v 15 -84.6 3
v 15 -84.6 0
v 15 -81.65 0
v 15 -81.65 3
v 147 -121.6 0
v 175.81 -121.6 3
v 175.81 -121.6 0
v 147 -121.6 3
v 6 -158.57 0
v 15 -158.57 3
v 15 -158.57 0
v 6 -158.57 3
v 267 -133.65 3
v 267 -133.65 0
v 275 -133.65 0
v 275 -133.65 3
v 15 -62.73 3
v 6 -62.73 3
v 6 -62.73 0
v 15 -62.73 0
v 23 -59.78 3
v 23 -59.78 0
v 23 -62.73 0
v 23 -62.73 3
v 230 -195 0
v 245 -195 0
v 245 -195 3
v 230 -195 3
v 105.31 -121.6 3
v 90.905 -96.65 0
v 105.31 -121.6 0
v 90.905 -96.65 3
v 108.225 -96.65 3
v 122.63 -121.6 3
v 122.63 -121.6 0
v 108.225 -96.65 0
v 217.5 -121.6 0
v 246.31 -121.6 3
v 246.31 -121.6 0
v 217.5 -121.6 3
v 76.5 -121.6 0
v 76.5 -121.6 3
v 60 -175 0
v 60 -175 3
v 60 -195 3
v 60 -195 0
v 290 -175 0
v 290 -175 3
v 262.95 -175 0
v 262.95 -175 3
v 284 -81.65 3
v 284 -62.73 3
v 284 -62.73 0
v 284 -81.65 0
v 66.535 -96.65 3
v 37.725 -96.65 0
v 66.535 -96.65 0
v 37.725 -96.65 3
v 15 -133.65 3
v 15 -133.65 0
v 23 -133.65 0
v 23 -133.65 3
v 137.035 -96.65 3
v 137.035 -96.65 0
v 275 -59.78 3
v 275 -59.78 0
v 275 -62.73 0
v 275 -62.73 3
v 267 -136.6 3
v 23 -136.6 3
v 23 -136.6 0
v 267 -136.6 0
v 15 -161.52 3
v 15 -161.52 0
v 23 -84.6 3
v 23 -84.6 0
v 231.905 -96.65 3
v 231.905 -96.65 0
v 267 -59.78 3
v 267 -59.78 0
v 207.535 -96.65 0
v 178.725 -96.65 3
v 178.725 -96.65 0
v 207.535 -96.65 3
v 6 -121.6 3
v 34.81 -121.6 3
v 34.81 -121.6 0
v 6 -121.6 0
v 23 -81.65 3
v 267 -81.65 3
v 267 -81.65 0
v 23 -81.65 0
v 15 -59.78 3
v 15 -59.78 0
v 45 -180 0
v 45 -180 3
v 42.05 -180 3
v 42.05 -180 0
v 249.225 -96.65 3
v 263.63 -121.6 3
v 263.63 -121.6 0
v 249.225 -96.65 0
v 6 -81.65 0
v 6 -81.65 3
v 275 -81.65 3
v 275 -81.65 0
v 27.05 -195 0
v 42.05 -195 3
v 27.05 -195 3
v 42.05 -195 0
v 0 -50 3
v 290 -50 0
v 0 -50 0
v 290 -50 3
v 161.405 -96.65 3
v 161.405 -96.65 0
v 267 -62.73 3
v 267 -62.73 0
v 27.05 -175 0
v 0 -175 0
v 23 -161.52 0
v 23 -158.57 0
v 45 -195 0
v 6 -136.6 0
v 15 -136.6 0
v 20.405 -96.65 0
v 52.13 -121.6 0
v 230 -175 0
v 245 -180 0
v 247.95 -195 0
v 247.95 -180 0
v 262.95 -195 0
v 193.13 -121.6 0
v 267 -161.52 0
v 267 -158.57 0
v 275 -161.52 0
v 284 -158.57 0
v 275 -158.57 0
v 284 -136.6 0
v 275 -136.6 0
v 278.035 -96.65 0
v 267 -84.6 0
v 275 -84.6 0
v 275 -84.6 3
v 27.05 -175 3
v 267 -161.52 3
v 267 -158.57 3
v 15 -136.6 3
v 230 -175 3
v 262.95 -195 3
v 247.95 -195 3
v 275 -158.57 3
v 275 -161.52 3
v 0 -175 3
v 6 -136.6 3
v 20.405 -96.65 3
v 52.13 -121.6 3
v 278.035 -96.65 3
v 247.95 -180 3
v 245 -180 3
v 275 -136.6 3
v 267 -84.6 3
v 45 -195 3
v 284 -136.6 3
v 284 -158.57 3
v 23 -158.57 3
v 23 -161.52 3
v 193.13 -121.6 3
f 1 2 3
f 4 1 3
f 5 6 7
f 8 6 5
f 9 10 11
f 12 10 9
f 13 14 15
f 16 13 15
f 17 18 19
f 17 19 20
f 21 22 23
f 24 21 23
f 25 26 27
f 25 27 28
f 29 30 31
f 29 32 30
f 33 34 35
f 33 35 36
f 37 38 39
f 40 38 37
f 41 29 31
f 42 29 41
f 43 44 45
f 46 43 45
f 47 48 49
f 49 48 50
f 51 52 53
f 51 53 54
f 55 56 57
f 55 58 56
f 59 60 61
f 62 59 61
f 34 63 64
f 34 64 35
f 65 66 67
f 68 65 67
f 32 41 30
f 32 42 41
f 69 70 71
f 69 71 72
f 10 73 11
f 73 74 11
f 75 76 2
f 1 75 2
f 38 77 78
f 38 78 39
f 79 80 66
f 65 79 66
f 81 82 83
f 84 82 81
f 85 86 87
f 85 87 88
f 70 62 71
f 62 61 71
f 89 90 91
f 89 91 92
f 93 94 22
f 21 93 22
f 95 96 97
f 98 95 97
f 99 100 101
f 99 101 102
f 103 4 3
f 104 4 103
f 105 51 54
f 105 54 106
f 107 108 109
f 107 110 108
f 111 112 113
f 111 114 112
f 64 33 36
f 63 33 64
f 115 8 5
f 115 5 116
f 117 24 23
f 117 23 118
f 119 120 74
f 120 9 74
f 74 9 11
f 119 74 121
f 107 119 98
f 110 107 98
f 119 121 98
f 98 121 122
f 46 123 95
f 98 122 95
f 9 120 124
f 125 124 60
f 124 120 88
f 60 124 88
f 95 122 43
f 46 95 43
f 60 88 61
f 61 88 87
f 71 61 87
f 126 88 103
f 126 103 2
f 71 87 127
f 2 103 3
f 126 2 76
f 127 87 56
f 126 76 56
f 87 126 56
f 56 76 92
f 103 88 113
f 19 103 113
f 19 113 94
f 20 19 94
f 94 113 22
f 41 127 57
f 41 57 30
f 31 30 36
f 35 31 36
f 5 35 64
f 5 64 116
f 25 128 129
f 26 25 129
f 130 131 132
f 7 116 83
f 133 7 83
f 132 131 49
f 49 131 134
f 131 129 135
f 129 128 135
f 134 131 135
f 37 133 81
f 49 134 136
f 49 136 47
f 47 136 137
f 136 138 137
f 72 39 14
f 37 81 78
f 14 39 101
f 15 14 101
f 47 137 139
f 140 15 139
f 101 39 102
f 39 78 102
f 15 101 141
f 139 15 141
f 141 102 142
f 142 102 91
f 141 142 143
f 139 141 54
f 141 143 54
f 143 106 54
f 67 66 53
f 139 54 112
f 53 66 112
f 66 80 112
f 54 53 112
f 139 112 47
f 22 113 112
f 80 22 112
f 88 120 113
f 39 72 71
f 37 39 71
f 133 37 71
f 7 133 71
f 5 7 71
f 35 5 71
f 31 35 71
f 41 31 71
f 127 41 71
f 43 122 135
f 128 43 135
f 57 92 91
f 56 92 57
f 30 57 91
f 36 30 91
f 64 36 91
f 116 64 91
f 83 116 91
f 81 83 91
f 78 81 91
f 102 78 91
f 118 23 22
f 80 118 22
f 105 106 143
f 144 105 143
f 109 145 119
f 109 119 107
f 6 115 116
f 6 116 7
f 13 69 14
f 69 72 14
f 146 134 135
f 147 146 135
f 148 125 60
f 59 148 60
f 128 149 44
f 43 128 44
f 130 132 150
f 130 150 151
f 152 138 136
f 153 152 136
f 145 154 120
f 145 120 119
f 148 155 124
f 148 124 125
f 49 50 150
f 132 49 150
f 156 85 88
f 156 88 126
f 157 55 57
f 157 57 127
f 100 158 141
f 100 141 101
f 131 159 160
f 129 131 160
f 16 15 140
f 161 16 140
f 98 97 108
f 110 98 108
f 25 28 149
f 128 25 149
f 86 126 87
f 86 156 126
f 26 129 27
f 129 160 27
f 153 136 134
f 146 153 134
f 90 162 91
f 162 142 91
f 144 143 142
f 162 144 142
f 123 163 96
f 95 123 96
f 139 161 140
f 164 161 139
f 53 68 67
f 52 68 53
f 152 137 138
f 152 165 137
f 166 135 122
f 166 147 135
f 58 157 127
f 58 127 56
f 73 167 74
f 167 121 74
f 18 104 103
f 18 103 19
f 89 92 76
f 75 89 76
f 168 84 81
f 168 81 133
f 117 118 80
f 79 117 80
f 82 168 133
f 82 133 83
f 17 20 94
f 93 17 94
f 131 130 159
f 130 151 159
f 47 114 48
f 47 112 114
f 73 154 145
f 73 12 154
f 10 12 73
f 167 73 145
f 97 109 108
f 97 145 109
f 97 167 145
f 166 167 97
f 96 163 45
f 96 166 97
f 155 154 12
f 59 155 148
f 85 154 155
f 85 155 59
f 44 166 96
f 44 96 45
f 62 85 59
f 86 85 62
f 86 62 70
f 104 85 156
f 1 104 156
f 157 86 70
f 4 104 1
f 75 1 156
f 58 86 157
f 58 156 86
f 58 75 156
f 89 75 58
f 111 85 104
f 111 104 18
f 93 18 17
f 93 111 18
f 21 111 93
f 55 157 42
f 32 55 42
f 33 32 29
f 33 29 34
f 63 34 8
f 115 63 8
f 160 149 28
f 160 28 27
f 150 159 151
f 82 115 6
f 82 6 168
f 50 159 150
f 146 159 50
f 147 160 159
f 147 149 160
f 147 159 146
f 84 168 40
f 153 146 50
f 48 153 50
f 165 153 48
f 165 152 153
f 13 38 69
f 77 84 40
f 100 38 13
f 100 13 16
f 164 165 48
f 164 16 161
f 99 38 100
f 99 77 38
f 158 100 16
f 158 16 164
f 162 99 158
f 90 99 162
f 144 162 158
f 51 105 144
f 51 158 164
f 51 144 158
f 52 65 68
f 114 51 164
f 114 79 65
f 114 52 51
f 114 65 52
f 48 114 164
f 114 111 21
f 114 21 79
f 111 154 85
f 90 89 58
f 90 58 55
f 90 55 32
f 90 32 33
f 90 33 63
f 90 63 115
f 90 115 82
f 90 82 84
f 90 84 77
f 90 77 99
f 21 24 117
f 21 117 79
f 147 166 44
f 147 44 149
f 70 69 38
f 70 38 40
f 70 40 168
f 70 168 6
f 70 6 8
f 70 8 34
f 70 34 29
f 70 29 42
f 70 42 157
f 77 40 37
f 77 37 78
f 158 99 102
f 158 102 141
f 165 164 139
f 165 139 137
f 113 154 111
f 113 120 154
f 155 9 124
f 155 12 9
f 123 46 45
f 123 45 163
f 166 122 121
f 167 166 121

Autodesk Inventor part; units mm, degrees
ref_plane "YZ Plane" through (0, 0, 0) normal (1, 0, 0) x (0, 1, 0)
ref_plane "XZ Plane" through (0, 0, 0) normal (0, 1, 0) x (-1, 0, 0)
ref_plane "XY Plane" through (0, 0, 0) normal (0, 0, 1) x (1, 0, 0)
sketch "草圖1" plane through (0, 0, 0) normal (0, 0, 1) x (1, 0, 0)
  line L0 (0, 0) -> (290, 0)
  line L1 (290, 0) -> (290, -195)
  line L2 (290, -195) -> (0, -195)
  line L3 (0, -195) -> (0, 0)
  line L4 (15, -59.78) -> (23, -59.78)
  line L5 (23, -59.78) -> (23, -62.73)
  line L6 (23, -62.73) -> (15, -62.73)
  line L7 (15, -62.73) -> (15, -59.78)
  line L8 (15, -81.65) -> (23, -81.65)
  line L9 (23, -81.65) -> (23, -84.6)
  line L10 (23, -84.6) -> (15, -84.6)
  line L11 (15, -84.6) -> (15, -81.65)
  line L12 (15, -133.65) -> (23, -133.65)
  line L13 (23, -133.65) -> (23, -136.6)
  line L14 (23, -136.6) -> (15, -136.6)
  line L15 (15, -136.6) -> (15, -133.65)
  line L16 (15, -158.57) -> (23, -158.57)
  line L17 (23, -158.57) -> (23, -161.52)
  line L18 (23, -161.52) -> (15, -161.52)
  line L19 (15, -161.52) -> (15, -158.57)
  line L20 (275, -81.65) -> (275, -84.6)
  line L21 (275, -59.78) -> (275, -62.73)
  line L22 (267, -81.65) -> (275, -81.65)
  line L23 (275, -62.73) -> (267, -62.73)
  line L24 (267, -59.78) -> (275, -59.78)
  line L25 (275, -84.6) -> (267, -84.6)
  line L26 (267, -84.6) -> (267, -81.65)
  line L27 (267, -62.73) -> (267, -59.78)
  line L28 (267, -133.65) -> (275, -133.65)
  line L29 (275, -133.65) -> (275, -136.6)
  line L30 (267, -136.6) -> (267, -133.65)
  line L31 (275, -136.6) -> (267, -136.6)
  line L32 (267, -158.57) -> (275, -158.57)
  line L33 (275, -158.57) -> (275, -161.52)
  line L34 (275, -161.52) -> (267, -161.52)
  line L35 (267, -161.52) -> (267, -158.57)
  line L36 (0, -97.5) -> (290, -97.5) construction
  line L37 (19, -84.6) -> (19, -133.65) construction
  line L38 (145, 0) -> (145, -195) construction
  line L39 (23, -83.125) -> (267, -83.125) construction
  point P0 (15, -83.125)
  point P1 (15, -61.255)
  point P2 (15, -135.125)
  point P3 (15, -160.045)
  point P4 (267, -61.255)
  point P5 (267, -135.125)
  point P6 (267, -160.045)
  point P7 (145, -83.125)
  dimension "d0" = 2.95
  dimension "d1" = 8
  dimension "d3" = 52
  dimension "d5" = 195
  dimension "d6" = 290
  dimension "d9" = 252
  dimension "d16" = 12.9
  dimension "d36" = 18.92
  dimension "d37" = 21.97
extrude "擠出1" add sketch "草圖1" along normal blind 3
sketch "草圖3" plane through (0, 0, 3) normal (0, 0, 1) x (1, 0, 0)
  line L0 (290, 0) -> (0, 0) projected
  line L1 (0, 0) -> (290, 0)
  line L2 (290, 0) -> (290, -50)
  line L3 (290, -50) -> (0, -50)
  line L4 (0, -50) -> (0, 0)
  line L5 (290, -195) -> (290, 0) projected
  line L6 (42.05, -195) -> (45, -195)
  line L7 (45, -195) -> (45, -180)
  line L8 (45, -180) -> (42.05, -180)
  line L9 (42.05, -180) -> (42.05, -195)
  line L10 (0, -195) -> (290, -195) projected
  line L11 (245, -195) -> (247.95, -195)
  line L12 (247.95, -195) -> (247.95, -180)
  line L13 (247.95, -180) -> (245, -180)
  line L14 (245, -180) -> (245, -195)
  line L15 (45, -187.5) -> (245, -187.5)
  point P0 (145, -195)
  point P1 (145, -187.5)
  point P2 (247.95, -195)
  dimension "d17" = 50
  dimension "d18" = 200
  dimension "d19" = 2.95
  dimension "d20" = 2.95
  dimension "d22" = 15
  dimension "d23" = 0
extrude "擠出2" cut sketch "草圖3" against normal up to surface (3 mm away) contours L2 L3 L4 L0 | L10 L14 L13 L12 | L6 L9 L8 L7
sketch "草圖6" plane through (0, 0, 3) normal (0, 0, 1) x (1, 0, 0)
  line L0 (6, -136.6) -> (284, -136.6)
  line L1 (284, -136.6) -> (284, -158.57)
  line L2 (284, -158.57) -> (6, -158.57)
  line L3 (6, -158.57) -> (6, -136.6)
  line L4 (23, -136.6) -> (15, -136.6) projected
  line L5 (15, -158.57) -> (23, -158.57) projected
  line L6 (0, -50) -> (0, -195) projected
  line L7 (290, -195) -> (290, -50) projected
  line L8 (6, -81.65) -> (6, -62.73)
  line L9 (6, -62.73) -> (284, -62.73)
  line L10 (284, -62.73) -> (284, -81.65)
  line L11 (284, -81.65) -> (6, -81.65)
  line L12 (15, -81.65) -> (23, -81.65) projected
  line L13 (23, -62.73) -> (15, -62.73) projected
  line L14 (20.4049, -96.65) -> (34.8098, -121.6)
  line L15 (34.8098, -121.6) -> (6, -121.6)
  line L16 (6, -121.6) -> (20.4049, -96.65)
  line L17 (37.7254, -96.65) -> (66.5352, -96.65)
  line L18 (66.5352, -96.65) -> (52.1303, -121.6)
  line L19 (52.1303, -121.6) -> (37.7254, -96.65)
  line L20 (105.3098, -121.6) -> (76.5, -121.6)
  line L21 (76.5, -121.6) -> (90.9049, -96.65)
  line L22 (90.9049, -96.65) -> (105.3098, -121.6)
  line L23 (122.6303, -121.6) -> (108.2254, -96.65)
  line L24 (137.0352, -96.65) -> (122.6303, -121.6)
  line L25 (108.2254, -96.65) -> (137.0352, -96.65)
  line L26 (175.8098, -121.6) -> (147, -121.6)
  line L27 (147, -121.6) -> (161.4049, -96.65)
  line L28 (161.4049, -96.65) -> (175.8098, -121.6)
  line L29 (193.1303, -121.6) -> (178.7254, -96.65)
  line L30 (207.5352, -96.65) -> (193.1303, -121.6)
  line L31 (178.7254, -96.65) -> (207.5352, -96.65)
  line L32 (246.3098, -121.6) -> (217.5, -121.6)
  line L33 (217.5, -121.6) -> (231.9049, -96.65)
  line L34 (231.9049, -96.65) -> (246.3098, -121.6)
  line L35 (263.6303, -121.6) -> (249.2254, -96.65)
  line L36 (278.0352, -96.65) -> (263.6303, -121.6)
  line L37 (249.2254, -96.65) -> (278.0352, -96.65)
  line L38 (45, -195) -> (245, -195) projected
  line L39 (60, -195) -> (230, -195)
  line L40 (230, -195) -> (230, -175)
  line L41 (230, -175) -> (60, -175)
  line L42 (60, -175) -> (60, -195)
  line L43 (262.95, -195) -> (290, -195)
  line L44 (290, -195) -> (290, -175)
  line L45 (290, -175) -> (262.95, -175)
  line L46 (262.95, -175) -> (262.95, -195)
  line L47 (0, -195) -> (42.05, -195) projected
  line L48 (27.05, -195) -> (0, -195)
  line L49 (0, -195) -> (0, -175)
  line L50 (0, -175) -> (27.05, -175)
  line L51 (27.05, -175) -> (27.05, -195)
  line L52 (42.05, -195) -> (42.05, -180) projected
  line L53 (45, -180) -> (45, -195) projected
  line L54 (245, -195) -> (245, -180) projected
  line L55 (247.95, -180) -> (247.95, -195) projected
  point P0 (0, 0)
  point P1 (284, -147.585)
  point P2 (20.4049, -113.2833)
  point P3 (52.1303, -104.9667)
  point P4 (122.6303, -104.9667)
  point P5 (90.9049, -113.2833)
  point P6 (193.1303, -104.9667)
  point P7 (161.4049, -113.2833)
  point P8 (263.6303, -104.9667)
  point P9 (231.9049, -113.2833)
  point P10 (42.05, -187.5)
  dimension "d32" = 6
  dimension "d33" = 6
  dimension "d39" = 15
  dimension "d40" = 15
  dimension "d41" = 15
  dimension "d44" = 70.5
  dimension "d49" = 20
  dimension "d50" = 15
  dimension "d51" = 15
  dimension "d52" = 15
  dimension "d53" = 15
extrude "擠出5" cut sketch "草圖6" against normal up to surface (3 mm away)
sketch "草圖8" plane through (0, 0, 3) normal (0, 0, 1) x (1, 0, 0)
  line L0 (275, -62.73) -> (284, -62.73) projected
  line L1 (284, -62.73) -> (284, -81.65) projected
  line L2 (284, -81.65) -> (275, -81.65) projected
  line L3 (275, -81.65) -> (275, -84.6) projected
  line L4 (275, -84.6) -> (267, -84.6) projected
  line L5 (267, -84.6) -> (267, -81.65) projected
  line L6 (267, -81.65) -> (23, -81.65) projected
  line L7 (23, -81.65) -> (23, -84.6) projected
  line L8 (23, -84.6) -> (15, -84.6) projected
  line L9 (15, -84.6) -> (15, -81.65) projected
  line L10 (15, -81.65) -> (6, -81.65) projected
  line L11 (6, -81.65) -> (6, -62.73) projected
  line L12 (6, -62.73) -> (15, -62.73) projected
  line L13 (15, -62.73) -> (15, -59.78) projected
  line L14 (15, -59.78) -> (23, -59.78) projected
  line L15 (23, -59.78) -> (23, -62.73) projected
  line L16 (23, -62.73) -> (267, -62.73) projected
  line L17 (267, -62.73) -> (267, -59.78) projected
  line L18 (267, -59.78) -> (275, -59.78) projected
  line L19 (275, -59.78) -> (275, -62.73) projected
  line L20 (15, -158.57) -> (6, -158.57) projected
  line L21 (6, -158.57) -> (6, -136.6) projected
  line L22 (6, -136.6) -> (15, -136.6) projected
  line L23 (15, -136.6) -> (15, -133.65) projected
  line L24 (15, -133.65) -> (23, -133.65) projected
  line L25 (23, -133.65) -> (23, -136.6) projected
  line L26 (23, -136.6) -> (267, -136.6) projected
  line L27 (267, -136.6) -> (267, -133.65) projected
  line L28 (267, -133.65) -> (275, -133.65) projected
  line L29 (275, -133.65) -> (275, -136.6) projected
  line L30 (275, -136.6) -> (284, -136.6) projected
  line L31 (284, -136.6) -> (284, -158.57) projected
  line L32 (284, -158.57) -> (275, -158.57) projected
  line L33 (275, -158.57) -> (275, -161.52) projected
  line L34 (275, -161.52) -> (267, -161.52) projected
  line L35 (267, -161.52) -> (267, -158.57) projected
  line L36 (267, -158.57) -> (23, -158.57) projected
  line L37 (23, -158.57) -> (23, -161.52) projected
  line L38 (23, -161.52) -> (15, -161.52) projected
  line L39 (15, -161.52) -> (15, -158.57) projected
  line L40 (52.1303, -121.6) -> (37.7254, -96.65) projected
  line L41 (37.7254, -96.65) -> (66.5352, -96.65) projected
  line L42 (66.5352, -96.65) -> (52.1303, -121.6) projected
  line L43 (207.5352, -96.65) -> (193.1303, -121.6) projected
  line L44 (193.1303, -121.6) -> (178.7254, -96.65) projected
  line L45 (178.7254, -96.65) -> (207.5352, -96.65) projected
  line L46 (108.2254, -96.65) -> (137.0352, -96.65) projected
  line L47 (137.0352, -96.65) -> (122.6303, -121.6) projected
  line L48 (122.6303, -121.6) -> (108.2254, -96.65) projected
  line L49 (249.2254, -96.65) -> (278.0352, -96.65) projected
  line L50 (278.0352, -96.65) -> (263.6303, -121.6) projected
  line L51 (263.6303, -121.6) -> (249.2254, -96.65) projected
  line L52 (90.9049, -96.65) -> (105.3098, -121.6) projected
  line L53 (105.3098, -121.6) -> (76.5, -121.6) projected
  line L54 (76.5, -121.6) -> (90.9049, -96.65) projected
  line L55 (147, -121.6) -> (161.4049, -96.65) projected
  line L56 (161.4049, -96.65) -> (175.8098, -121.6) projected
  line L57 (175.8098, -121.6) -> (147, -121.6) projected
  line L58 (34.8098, -121.6) -> (6, -121.6) projected
  line L59 (6, -121.6) -> (20.4049, -96.65) projected
  line L60 (20.4049, -96.65) -> (34.8098, -121.6) projected
  line L61 (217.5, -121.6) -> (231.9049, -96.65) projected
  line L62 (231.9049, -96.65) -> (246.3098, -121.6) projected
  line L63 (246.3098, -121.6) -> (217.5, -121.6) projected
  line L64 (262.95, -195) -> (262.95, -175) projected
  line L65 (262.95, -175) -> (290, -175) projected
  line L66 (290, -175) -> (290, -50) projected
  line L67 (290, -50) -> (0, -50) projected
  line L68 (0, -50) -> (0, -175) projected
  line L69 (0, -175) -> (27.05, -175) projected
  line L70 (27.05, -175) -> (27.05, -195) projected
  line L71 (27.05, -195) -> (42.05, -195) projected
  line L72 (42.05, -195) -> (42.05, -180) projected
  line L73 (42.05, -180) -> (45, -180) projected
  line L74 (45, -180) -> (45, -195) projected
  line L75 (45, -195) -> (60, -195) projected
  line L76 (60, -195) -> (60, -175) projected
  line L77 (60, -175) -> (230, -175) projected
  line L78 (230, -175) -> (230, -195) projected
  line L79 (230, -195) -> (245, -195) projected
  line L80 (245, -195) -> (245, -180) projected
  line L81 (245, -180) -> (247.95, -180) projected
  line L82 (247.95, -180) -> (247.95, -195) projected
  line L83 (247.95, -195) -> (262.95, -195) projected
  point P0 (0, 0)
